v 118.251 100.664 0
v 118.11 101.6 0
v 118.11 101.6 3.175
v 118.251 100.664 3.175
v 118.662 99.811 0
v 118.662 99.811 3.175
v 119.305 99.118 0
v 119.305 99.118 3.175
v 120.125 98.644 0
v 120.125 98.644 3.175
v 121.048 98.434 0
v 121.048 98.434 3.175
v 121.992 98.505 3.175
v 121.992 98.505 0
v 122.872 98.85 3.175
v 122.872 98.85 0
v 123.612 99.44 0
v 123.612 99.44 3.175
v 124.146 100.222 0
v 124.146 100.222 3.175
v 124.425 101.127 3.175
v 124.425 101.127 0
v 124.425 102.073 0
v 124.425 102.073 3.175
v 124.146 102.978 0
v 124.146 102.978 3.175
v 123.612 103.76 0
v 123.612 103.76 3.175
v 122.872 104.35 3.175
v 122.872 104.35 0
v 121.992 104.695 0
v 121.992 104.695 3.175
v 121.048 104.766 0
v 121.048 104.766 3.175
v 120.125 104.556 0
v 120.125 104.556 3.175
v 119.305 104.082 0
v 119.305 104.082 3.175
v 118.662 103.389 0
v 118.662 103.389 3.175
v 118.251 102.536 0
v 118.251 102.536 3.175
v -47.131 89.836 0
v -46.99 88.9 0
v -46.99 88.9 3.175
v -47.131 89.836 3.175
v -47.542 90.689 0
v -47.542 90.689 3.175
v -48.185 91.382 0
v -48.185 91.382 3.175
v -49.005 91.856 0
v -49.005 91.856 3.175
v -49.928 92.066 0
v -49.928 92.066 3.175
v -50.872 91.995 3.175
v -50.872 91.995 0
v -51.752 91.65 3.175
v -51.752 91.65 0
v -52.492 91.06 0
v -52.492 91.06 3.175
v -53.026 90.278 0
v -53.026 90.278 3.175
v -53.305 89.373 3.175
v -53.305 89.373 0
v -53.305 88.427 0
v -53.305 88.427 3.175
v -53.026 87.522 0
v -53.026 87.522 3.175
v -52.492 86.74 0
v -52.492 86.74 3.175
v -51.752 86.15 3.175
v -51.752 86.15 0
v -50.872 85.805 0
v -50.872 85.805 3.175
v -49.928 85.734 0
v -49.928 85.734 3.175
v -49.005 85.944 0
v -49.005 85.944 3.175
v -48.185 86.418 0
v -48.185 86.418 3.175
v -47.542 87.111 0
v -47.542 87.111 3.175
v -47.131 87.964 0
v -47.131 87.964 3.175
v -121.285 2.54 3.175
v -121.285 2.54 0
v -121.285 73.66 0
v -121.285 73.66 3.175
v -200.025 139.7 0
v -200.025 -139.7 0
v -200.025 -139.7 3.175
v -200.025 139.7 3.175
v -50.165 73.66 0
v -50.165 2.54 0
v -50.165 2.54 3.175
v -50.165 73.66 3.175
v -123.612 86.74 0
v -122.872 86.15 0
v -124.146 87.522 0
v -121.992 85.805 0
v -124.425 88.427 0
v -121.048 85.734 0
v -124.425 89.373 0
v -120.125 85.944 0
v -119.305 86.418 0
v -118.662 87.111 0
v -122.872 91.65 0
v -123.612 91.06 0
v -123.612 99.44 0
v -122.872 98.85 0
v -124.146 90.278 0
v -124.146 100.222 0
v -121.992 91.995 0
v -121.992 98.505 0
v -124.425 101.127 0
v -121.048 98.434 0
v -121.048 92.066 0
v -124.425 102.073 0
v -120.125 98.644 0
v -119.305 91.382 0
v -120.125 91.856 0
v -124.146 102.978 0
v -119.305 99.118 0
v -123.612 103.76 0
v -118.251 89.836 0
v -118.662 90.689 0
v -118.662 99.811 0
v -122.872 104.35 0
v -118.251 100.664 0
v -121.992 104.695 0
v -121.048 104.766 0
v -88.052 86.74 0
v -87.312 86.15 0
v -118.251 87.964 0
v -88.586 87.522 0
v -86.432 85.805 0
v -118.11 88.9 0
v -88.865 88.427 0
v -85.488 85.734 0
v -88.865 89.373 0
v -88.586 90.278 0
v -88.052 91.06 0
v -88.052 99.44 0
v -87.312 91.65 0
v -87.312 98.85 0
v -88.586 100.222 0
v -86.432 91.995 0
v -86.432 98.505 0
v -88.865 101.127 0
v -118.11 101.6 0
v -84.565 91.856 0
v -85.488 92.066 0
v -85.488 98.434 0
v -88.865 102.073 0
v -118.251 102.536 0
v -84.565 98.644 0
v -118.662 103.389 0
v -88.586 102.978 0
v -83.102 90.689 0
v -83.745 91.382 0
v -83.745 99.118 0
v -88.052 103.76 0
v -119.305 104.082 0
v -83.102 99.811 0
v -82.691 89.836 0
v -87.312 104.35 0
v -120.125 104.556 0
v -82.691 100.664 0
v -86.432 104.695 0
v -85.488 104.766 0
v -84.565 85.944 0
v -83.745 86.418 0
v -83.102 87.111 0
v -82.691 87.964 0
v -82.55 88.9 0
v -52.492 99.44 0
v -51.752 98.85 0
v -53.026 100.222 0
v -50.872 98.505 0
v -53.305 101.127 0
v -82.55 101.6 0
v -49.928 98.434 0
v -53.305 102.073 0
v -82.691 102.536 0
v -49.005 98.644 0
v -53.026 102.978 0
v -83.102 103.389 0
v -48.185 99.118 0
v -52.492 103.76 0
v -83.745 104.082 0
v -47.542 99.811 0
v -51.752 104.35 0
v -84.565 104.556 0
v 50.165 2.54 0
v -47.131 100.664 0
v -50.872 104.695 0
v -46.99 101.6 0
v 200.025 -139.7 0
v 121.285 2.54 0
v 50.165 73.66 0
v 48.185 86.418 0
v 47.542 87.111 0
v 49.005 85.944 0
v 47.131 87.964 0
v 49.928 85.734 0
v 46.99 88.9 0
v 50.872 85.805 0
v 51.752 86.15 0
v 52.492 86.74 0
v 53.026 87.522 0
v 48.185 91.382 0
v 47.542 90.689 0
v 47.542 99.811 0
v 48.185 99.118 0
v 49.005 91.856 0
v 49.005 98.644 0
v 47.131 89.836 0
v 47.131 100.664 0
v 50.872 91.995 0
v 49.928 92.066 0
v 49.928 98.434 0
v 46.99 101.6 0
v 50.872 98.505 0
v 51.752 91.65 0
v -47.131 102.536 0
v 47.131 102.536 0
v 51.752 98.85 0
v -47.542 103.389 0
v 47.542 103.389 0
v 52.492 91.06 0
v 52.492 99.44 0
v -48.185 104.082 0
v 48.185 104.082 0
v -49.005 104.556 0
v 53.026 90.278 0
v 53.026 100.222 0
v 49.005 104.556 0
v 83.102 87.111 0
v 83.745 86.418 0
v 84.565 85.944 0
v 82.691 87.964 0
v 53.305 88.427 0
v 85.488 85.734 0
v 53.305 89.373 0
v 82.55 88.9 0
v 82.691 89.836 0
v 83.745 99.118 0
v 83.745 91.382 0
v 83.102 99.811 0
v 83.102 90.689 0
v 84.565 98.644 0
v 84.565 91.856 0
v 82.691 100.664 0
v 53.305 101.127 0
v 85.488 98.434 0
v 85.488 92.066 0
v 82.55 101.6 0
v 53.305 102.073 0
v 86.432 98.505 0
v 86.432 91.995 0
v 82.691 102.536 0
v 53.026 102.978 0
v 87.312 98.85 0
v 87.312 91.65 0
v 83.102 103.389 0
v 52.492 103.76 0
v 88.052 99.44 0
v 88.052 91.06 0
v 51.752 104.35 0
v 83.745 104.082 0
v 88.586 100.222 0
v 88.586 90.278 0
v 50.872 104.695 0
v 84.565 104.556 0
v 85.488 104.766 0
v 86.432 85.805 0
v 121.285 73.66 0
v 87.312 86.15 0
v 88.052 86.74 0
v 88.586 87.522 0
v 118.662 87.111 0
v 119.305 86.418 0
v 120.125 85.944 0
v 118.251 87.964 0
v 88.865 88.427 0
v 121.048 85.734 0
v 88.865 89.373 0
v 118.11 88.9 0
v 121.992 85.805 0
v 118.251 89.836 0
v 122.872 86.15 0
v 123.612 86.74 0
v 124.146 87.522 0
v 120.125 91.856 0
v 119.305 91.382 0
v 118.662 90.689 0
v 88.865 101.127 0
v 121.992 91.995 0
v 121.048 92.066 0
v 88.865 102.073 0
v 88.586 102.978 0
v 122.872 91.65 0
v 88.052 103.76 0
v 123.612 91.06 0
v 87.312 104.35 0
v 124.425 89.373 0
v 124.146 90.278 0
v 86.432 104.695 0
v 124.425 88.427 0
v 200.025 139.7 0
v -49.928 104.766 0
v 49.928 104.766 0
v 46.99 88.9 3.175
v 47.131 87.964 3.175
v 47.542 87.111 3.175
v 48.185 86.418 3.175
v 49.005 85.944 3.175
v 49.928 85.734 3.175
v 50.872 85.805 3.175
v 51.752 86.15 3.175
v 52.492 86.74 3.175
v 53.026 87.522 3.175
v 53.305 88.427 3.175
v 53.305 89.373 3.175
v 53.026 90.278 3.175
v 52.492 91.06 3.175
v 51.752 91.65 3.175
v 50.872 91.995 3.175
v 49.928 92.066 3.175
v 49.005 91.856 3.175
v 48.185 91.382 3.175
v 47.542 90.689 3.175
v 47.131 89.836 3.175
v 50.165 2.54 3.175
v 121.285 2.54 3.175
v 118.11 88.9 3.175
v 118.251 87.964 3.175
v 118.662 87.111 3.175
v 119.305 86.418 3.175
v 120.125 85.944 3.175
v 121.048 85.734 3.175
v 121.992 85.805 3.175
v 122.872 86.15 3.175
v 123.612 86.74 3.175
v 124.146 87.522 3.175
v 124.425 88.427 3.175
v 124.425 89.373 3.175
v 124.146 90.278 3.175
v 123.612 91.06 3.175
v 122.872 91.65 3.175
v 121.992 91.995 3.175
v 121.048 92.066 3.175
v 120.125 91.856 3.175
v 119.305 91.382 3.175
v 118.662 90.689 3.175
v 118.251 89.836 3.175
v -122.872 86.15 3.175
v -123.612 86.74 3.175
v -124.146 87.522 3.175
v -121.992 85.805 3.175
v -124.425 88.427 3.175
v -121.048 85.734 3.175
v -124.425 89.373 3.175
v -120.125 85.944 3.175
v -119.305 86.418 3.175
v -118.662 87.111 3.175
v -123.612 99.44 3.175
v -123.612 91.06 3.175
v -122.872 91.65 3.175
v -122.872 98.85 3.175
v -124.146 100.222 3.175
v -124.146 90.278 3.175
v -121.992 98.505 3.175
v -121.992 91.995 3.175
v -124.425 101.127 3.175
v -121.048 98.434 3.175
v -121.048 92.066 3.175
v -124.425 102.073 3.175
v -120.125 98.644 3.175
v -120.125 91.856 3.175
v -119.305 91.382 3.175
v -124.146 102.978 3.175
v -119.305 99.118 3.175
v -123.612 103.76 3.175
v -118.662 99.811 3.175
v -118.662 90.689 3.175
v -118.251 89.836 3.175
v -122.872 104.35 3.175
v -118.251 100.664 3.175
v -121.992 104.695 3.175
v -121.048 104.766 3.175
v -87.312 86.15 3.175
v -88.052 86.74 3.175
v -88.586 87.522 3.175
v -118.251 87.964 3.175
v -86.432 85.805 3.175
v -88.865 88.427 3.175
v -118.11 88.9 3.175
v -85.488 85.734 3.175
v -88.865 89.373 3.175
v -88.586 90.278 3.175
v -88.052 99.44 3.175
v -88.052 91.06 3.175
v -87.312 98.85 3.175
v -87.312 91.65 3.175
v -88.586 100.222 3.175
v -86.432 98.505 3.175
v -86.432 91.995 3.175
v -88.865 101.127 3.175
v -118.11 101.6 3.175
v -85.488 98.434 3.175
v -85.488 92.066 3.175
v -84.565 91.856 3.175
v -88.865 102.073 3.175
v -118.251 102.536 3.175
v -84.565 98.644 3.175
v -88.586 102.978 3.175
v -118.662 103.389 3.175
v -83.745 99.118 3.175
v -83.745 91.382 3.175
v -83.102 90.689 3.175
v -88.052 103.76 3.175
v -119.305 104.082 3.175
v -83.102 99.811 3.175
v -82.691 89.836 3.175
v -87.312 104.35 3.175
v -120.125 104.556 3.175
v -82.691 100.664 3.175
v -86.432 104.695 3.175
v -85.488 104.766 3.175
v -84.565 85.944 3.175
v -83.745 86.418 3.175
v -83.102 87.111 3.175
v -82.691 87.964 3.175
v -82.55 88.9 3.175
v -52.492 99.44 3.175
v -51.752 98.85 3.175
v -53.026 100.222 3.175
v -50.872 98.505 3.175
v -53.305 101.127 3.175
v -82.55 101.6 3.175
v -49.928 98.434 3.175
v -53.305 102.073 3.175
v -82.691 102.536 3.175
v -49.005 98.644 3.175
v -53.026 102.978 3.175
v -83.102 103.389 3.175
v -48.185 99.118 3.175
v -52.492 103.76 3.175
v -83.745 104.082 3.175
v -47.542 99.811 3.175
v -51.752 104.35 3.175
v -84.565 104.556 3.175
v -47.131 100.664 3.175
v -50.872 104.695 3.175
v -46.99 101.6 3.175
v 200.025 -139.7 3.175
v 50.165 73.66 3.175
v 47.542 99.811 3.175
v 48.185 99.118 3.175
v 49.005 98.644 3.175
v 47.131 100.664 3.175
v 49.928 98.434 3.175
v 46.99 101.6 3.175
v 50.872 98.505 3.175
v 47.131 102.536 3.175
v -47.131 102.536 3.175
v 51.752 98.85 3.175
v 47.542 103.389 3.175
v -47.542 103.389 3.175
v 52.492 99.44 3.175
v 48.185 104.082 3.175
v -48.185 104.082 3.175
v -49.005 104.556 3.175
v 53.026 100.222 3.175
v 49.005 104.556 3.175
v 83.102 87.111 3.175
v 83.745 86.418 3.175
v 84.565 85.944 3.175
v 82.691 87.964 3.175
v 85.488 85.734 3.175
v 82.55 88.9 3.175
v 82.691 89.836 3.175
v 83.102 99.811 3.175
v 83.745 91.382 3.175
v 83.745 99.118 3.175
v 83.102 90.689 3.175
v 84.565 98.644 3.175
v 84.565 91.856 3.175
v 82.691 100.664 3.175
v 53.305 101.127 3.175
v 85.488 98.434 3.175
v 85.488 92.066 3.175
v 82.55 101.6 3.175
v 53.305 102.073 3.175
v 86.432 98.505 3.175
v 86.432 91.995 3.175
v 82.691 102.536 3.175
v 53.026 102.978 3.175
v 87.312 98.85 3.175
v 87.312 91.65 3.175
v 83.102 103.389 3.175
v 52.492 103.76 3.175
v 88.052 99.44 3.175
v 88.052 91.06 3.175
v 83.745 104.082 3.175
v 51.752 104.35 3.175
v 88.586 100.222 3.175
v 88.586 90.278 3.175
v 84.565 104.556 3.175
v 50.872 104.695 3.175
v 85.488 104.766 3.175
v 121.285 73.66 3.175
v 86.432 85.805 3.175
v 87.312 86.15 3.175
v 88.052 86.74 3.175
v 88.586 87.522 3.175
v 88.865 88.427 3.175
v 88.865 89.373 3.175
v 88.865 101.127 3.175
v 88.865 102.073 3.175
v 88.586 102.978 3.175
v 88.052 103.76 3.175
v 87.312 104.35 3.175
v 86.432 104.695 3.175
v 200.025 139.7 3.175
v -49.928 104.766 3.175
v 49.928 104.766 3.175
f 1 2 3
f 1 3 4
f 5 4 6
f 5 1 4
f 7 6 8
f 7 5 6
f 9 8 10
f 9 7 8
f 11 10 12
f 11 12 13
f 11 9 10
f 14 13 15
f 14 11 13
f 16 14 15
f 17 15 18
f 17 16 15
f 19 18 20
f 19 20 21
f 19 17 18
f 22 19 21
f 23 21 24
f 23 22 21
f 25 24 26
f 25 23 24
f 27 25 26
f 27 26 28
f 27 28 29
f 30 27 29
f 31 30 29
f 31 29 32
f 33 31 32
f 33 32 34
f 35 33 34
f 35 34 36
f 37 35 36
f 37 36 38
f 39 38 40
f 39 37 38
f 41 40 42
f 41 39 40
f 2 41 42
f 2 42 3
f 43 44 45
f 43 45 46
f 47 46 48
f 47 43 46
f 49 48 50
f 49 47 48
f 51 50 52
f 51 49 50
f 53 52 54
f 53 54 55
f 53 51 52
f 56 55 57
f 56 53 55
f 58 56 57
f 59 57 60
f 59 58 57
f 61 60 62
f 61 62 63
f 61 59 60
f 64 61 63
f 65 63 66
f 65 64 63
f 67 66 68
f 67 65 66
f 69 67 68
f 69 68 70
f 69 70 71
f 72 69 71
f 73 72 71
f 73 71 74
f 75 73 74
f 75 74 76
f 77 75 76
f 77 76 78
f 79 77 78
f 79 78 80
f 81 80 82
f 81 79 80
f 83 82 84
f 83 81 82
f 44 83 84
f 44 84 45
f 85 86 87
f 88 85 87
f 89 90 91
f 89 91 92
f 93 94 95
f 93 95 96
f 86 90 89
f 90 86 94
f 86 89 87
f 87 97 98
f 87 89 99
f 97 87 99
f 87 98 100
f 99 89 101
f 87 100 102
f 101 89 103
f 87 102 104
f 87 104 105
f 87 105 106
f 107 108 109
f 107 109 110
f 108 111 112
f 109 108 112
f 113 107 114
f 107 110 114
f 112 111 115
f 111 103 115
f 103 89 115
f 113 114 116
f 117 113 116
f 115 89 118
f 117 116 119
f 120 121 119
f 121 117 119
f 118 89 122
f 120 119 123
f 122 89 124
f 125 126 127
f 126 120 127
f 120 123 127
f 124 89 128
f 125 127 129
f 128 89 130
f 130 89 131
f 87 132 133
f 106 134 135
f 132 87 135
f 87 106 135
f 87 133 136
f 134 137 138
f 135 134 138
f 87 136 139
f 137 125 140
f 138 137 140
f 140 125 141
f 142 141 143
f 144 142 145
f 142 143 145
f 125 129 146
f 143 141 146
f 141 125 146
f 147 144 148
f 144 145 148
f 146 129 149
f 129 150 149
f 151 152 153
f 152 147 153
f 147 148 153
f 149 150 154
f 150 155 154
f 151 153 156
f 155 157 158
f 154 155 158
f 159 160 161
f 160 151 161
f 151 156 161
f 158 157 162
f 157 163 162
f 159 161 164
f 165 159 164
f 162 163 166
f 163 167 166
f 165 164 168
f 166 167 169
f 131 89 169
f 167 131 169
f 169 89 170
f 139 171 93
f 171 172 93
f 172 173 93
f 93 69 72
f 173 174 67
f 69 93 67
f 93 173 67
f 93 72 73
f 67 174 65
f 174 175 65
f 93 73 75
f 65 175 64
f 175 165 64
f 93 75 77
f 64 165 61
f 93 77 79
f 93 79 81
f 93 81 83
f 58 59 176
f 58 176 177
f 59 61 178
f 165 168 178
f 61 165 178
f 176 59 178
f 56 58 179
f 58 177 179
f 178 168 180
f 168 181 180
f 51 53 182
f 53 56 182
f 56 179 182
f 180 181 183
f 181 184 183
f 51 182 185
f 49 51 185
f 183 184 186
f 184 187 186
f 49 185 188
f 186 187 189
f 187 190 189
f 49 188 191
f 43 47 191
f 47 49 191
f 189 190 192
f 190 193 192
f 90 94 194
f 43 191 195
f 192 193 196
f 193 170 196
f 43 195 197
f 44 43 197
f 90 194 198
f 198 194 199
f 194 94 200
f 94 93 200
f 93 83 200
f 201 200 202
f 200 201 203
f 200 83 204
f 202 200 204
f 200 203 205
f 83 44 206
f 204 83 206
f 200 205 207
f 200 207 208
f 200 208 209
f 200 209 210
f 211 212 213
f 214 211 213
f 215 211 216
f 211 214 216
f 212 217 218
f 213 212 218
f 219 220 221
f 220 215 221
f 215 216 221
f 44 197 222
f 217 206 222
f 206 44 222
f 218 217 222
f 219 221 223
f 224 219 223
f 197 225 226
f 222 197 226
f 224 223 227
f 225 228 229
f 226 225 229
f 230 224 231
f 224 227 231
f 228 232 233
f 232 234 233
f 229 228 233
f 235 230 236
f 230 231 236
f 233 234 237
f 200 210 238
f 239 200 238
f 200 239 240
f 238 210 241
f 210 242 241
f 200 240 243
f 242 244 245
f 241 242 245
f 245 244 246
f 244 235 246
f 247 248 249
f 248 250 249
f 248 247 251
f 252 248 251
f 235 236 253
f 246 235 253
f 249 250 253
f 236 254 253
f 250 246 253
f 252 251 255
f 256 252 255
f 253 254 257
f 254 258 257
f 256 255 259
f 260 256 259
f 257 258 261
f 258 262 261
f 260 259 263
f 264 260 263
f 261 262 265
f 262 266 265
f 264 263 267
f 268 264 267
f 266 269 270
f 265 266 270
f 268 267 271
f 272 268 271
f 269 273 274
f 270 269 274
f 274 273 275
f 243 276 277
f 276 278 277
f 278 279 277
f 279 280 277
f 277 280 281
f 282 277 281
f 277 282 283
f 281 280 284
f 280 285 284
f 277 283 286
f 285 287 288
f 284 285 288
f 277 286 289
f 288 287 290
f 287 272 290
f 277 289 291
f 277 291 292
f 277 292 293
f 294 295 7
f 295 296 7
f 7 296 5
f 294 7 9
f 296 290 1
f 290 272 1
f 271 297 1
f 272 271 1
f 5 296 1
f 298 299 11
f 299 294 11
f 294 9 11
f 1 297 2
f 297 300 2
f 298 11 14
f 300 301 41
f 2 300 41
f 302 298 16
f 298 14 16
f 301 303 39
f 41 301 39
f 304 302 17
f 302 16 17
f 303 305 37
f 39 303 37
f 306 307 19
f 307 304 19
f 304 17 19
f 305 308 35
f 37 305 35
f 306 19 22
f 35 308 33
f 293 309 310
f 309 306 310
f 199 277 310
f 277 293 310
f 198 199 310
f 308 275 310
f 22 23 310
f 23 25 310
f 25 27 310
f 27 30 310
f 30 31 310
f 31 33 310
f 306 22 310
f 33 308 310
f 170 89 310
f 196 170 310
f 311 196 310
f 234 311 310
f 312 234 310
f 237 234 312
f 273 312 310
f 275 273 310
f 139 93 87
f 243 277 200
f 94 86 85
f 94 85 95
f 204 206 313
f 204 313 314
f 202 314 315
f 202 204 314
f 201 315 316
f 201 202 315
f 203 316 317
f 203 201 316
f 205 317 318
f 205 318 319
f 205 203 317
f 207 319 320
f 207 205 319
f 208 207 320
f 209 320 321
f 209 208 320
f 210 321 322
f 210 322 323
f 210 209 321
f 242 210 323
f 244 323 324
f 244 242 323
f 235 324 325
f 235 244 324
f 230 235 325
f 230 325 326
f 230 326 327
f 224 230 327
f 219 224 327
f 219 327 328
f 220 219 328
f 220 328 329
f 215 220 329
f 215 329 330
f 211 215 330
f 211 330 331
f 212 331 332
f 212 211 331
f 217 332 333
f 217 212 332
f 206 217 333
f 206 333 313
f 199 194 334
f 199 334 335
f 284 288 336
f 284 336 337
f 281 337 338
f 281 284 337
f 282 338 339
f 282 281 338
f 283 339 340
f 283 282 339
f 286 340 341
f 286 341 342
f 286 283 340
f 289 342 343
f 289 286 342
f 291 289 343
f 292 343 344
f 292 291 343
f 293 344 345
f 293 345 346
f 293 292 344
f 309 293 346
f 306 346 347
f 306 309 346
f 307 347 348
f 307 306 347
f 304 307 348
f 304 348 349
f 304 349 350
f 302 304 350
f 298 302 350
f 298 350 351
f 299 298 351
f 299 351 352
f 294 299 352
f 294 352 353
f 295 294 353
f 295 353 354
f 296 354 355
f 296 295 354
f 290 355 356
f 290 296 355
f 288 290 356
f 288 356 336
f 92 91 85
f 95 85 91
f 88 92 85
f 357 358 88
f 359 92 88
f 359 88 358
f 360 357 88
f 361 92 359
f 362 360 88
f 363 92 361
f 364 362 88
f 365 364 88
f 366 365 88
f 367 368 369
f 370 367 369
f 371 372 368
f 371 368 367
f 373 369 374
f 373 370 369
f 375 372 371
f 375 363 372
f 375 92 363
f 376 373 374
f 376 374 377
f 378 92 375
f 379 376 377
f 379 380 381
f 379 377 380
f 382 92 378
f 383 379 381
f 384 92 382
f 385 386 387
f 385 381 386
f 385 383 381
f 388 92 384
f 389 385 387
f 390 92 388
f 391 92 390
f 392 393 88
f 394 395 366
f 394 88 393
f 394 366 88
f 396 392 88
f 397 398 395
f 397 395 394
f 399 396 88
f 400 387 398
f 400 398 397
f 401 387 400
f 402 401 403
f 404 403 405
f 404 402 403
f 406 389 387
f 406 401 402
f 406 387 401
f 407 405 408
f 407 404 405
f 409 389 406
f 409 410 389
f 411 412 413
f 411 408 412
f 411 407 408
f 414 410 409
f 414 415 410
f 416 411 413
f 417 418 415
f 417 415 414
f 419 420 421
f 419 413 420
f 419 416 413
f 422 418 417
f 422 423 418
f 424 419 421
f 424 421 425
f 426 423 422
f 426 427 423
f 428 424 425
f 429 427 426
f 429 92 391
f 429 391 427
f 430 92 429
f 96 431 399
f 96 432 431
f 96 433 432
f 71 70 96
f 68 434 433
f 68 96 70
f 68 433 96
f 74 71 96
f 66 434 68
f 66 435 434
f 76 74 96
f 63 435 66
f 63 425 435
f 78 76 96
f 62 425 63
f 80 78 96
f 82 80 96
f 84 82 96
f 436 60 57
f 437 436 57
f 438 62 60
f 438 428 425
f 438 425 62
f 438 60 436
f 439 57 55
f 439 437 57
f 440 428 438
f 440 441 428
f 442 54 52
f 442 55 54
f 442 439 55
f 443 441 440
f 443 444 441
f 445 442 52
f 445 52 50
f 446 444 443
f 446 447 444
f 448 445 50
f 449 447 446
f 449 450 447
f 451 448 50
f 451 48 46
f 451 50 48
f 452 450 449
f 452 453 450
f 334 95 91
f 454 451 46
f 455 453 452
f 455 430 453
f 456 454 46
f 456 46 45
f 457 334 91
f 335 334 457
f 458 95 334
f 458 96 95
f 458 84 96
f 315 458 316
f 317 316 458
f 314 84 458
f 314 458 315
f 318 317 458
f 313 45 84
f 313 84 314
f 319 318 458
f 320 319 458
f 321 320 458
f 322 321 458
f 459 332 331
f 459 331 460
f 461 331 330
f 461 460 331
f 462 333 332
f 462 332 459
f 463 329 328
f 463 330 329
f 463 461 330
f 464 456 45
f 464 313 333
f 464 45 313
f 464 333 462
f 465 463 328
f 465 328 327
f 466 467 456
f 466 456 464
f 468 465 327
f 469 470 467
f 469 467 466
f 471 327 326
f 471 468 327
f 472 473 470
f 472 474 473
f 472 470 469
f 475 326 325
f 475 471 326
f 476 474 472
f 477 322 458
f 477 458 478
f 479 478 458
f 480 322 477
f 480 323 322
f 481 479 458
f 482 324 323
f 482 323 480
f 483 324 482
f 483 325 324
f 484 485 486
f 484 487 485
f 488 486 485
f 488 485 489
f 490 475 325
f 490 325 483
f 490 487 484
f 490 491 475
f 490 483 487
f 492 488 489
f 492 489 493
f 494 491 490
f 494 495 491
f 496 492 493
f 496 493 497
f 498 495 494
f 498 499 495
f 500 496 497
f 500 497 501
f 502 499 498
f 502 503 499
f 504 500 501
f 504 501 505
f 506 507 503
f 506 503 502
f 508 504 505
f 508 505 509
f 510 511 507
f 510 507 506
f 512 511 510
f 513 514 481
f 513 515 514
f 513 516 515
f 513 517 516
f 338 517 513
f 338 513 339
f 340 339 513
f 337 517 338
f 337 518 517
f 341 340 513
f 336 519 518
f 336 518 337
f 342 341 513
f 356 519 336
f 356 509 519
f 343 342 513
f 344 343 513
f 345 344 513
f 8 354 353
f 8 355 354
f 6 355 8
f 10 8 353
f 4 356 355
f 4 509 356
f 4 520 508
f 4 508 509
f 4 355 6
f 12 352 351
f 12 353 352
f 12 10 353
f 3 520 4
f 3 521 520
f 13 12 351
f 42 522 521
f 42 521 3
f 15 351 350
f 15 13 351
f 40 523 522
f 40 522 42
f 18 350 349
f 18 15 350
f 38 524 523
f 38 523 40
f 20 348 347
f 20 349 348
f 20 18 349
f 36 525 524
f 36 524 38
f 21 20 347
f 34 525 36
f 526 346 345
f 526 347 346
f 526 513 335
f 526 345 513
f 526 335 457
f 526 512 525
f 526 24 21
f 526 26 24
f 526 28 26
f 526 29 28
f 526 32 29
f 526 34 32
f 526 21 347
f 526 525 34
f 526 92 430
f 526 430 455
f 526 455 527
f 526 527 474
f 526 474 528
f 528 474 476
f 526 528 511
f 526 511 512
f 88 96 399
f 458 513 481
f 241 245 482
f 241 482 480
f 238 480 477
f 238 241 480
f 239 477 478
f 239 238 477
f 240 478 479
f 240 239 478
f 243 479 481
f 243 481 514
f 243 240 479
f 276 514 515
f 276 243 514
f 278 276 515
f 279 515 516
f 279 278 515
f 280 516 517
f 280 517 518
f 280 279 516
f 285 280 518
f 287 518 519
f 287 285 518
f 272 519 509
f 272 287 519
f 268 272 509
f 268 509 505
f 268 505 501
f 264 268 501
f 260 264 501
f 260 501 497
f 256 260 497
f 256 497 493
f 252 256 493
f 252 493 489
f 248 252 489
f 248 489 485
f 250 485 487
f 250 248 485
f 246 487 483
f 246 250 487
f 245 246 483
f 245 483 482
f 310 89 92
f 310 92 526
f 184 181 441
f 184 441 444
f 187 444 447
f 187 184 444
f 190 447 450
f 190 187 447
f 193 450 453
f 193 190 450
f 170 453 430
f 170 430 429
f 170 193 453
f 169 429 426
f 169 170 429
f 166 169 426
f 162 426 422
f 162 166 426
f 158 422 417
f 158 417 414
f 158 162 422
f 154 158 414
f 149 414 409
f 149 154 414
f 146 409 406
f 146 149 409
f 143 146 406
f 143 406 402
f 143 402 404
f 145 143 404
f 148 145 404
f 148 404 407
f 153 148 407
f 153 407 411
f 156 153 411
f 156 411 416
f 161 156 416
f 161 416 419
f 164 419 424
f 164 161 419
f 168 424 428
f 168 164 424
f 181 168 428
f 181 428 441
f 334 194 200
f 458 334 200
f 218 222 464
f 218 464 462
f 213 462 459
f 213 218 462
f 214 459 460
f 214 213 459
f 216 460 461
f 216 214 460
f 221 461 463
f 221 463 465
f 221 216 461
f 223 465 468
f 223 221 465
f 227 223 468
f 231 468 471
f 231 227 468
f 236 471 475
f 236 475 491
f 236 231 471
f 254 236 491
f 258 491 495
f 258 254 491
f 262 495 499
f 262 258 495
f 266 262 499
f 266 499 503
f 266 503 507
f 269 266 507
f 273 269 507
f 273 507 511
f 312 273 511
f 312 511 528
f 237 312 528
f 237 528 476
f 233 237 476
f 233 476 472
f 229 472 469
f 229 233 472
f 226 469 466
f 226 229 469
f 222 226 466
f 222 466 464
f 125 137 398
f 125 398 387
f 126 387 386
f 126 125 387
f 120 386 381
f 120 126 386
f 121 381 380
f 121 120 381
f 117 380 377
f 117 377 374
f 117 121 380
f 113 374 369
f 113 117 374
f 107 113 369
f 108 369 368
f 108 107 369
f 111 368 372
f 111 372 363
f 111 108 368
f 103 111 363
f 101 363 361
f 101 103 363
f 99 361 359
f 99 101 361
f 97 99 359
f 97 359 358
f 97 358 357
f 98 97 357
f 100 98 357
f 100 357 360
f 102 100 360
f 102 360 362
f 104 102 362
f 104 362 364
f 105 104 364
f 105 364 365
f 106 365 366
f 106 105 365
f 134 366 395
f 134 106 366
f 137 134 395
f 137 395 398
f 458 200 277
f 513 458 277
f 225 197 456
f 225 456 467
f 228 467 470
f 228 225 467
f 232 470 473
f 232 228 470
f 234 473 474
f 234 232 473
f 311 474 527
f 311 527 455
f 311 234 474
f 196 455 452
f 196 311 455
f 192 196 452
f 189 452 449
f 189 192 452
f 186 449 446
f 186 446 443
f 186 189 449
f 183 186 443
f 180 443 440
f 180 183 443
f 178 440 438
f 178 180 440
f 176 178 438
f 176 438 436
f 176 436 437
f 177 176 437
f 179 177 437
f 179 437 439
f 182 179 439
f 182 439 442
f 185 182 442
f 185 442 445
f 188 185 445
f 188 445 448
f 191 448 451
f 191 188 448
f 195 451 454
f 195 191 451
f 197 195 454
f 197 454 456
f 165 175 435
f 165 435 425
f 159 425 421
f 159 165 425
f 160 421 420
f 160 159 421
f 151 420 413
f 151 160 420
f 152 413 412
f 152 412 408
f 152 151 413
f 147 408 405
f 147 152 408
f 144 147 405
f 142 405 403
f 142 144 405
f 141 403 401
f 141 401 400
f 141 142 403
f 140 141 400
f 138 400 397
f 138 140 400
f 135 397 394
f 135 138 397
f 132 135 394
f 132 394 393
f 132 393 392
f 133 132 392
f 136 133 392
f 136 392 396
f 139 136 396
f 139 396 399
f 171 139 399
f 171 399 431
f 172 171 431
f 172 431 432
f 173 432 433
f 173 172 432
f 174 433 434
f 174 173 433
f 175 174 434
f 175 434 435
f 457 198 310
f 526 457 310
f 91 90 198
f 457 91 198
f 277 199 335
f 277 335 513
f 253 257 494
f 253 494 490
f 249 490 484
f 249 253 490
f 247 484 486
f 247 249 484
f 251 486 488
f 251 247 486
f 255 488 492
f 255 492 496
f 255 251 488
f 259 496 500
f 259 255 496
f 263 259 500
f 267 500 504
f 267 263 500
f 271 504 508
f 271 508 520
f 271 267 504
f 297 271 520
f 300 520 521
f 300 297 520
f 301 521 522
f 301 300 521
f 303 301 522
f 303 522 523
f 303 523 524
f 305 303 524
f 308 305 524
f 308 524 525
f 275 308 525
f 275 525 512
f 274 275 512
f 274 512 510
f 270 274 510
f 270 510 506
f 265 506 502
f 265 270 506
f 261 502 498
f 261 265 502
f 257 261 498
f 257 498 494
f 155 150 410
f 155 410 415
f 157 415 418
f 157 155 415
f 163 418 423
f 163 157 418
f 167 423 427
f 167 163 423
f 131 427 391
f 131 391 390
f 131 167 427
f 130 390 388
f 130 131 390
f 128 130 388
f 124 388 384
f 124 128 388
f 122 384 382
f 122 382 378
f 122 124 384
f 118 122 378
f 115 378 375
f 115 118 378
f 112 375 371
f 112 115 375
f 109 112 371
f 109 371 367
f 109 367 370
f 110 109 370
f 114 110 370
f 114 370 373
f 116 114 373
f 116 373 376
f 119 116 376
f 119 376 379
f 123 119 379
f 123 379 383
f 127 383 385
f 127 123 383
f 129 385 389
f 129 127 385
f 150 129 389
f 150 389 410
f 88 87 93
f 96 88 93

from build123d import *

# Parameters (mm, degrees)
SKETCH1_W           = 400.05
SKETCH1_H           = 279.4
SKETCH1_R           = 3.175
SKETCH1_W_2         = 71.12
SKETCH1_H_2         = 71.12
BOSS_EXTRUDE1_DEPTH = 3.175


with BuildPart() as part:
    # Sketch1 → Boss-Extrude1 (new body)
    with BuildSketch(Plane.XY):
        Rectangle(SKETCH1_W, SKETCH1_H)
        with Locations((-85.725, 88.9)):
            Circle(SKETCH1_R, mode=Mode.SUBTRACT)
        with Locations((-121.285, 88.9)):
            Circle(SKETCH1_R, mode=Mode.SUBTRACT)
        with Locations((-50.165, 88.9)):
            Circle(SKETCH1_R, mode=Mode.SUBTRACT)
        with Locations((-50.165, 101.6)):
            Circle(SKETCH1_R, mode=Mode.SUBTRACT)
        with Locations((-85.725, 101.6)):
            Circle(SKETCH1_R, mode=Mode.SUBTRACT)
        with Locations((-121.285, 101.6)):
            Circle(SKETCH1_R, mode=Mode.SUBTRACT)
        with Locations(Location((121.285, 88.9, 0), (0, 0, 180))):
            Circle(SKETCH1_R, mode=Mode.SUBTRACT)
        with Locations(Location((85.725, 88.9, 0), (0, 0, 180))):
            Circle(SKETCH1_R, mode=Mode.SUBTRACT)
        with Locations(Location((50.165, 88.9, 0), (0, 0, 180))):
            Circle(SKETCH1_R, mode=Mode.SUBTRACT)
        with Locations(Location((50.165, 101.6, 0), (0, 0, 180))):
            Circle(SKETCH1_R, mode=Mode.SUBTRACT)
        with Locations(Location((85.725, 101.6, 0), (0, 0, 180))):
            Circle(SKETCH1_R, mode=Mode.SUBTRACT)
        with Locations(Location((121.285, 101.6, 0), (0, 0, 180))):
            Circle(SKETCH1_R, mode=Mode.SUBTRACT)
        with Locations((-85.725, 38.1)):
            Rectangle(SKETCH1_W_2, SKETCH1_H_2, mode=Mode.SUBTRACT)
        with Locations((85.725, 38.1)):
            Rectangle(SKETCH1_W_2, SKETCH1_H_2, mode=Mode.SUBTRACT)
    extrude(amount=BOSS_EXTRUDE1_DEPTH)


solid = part.part
